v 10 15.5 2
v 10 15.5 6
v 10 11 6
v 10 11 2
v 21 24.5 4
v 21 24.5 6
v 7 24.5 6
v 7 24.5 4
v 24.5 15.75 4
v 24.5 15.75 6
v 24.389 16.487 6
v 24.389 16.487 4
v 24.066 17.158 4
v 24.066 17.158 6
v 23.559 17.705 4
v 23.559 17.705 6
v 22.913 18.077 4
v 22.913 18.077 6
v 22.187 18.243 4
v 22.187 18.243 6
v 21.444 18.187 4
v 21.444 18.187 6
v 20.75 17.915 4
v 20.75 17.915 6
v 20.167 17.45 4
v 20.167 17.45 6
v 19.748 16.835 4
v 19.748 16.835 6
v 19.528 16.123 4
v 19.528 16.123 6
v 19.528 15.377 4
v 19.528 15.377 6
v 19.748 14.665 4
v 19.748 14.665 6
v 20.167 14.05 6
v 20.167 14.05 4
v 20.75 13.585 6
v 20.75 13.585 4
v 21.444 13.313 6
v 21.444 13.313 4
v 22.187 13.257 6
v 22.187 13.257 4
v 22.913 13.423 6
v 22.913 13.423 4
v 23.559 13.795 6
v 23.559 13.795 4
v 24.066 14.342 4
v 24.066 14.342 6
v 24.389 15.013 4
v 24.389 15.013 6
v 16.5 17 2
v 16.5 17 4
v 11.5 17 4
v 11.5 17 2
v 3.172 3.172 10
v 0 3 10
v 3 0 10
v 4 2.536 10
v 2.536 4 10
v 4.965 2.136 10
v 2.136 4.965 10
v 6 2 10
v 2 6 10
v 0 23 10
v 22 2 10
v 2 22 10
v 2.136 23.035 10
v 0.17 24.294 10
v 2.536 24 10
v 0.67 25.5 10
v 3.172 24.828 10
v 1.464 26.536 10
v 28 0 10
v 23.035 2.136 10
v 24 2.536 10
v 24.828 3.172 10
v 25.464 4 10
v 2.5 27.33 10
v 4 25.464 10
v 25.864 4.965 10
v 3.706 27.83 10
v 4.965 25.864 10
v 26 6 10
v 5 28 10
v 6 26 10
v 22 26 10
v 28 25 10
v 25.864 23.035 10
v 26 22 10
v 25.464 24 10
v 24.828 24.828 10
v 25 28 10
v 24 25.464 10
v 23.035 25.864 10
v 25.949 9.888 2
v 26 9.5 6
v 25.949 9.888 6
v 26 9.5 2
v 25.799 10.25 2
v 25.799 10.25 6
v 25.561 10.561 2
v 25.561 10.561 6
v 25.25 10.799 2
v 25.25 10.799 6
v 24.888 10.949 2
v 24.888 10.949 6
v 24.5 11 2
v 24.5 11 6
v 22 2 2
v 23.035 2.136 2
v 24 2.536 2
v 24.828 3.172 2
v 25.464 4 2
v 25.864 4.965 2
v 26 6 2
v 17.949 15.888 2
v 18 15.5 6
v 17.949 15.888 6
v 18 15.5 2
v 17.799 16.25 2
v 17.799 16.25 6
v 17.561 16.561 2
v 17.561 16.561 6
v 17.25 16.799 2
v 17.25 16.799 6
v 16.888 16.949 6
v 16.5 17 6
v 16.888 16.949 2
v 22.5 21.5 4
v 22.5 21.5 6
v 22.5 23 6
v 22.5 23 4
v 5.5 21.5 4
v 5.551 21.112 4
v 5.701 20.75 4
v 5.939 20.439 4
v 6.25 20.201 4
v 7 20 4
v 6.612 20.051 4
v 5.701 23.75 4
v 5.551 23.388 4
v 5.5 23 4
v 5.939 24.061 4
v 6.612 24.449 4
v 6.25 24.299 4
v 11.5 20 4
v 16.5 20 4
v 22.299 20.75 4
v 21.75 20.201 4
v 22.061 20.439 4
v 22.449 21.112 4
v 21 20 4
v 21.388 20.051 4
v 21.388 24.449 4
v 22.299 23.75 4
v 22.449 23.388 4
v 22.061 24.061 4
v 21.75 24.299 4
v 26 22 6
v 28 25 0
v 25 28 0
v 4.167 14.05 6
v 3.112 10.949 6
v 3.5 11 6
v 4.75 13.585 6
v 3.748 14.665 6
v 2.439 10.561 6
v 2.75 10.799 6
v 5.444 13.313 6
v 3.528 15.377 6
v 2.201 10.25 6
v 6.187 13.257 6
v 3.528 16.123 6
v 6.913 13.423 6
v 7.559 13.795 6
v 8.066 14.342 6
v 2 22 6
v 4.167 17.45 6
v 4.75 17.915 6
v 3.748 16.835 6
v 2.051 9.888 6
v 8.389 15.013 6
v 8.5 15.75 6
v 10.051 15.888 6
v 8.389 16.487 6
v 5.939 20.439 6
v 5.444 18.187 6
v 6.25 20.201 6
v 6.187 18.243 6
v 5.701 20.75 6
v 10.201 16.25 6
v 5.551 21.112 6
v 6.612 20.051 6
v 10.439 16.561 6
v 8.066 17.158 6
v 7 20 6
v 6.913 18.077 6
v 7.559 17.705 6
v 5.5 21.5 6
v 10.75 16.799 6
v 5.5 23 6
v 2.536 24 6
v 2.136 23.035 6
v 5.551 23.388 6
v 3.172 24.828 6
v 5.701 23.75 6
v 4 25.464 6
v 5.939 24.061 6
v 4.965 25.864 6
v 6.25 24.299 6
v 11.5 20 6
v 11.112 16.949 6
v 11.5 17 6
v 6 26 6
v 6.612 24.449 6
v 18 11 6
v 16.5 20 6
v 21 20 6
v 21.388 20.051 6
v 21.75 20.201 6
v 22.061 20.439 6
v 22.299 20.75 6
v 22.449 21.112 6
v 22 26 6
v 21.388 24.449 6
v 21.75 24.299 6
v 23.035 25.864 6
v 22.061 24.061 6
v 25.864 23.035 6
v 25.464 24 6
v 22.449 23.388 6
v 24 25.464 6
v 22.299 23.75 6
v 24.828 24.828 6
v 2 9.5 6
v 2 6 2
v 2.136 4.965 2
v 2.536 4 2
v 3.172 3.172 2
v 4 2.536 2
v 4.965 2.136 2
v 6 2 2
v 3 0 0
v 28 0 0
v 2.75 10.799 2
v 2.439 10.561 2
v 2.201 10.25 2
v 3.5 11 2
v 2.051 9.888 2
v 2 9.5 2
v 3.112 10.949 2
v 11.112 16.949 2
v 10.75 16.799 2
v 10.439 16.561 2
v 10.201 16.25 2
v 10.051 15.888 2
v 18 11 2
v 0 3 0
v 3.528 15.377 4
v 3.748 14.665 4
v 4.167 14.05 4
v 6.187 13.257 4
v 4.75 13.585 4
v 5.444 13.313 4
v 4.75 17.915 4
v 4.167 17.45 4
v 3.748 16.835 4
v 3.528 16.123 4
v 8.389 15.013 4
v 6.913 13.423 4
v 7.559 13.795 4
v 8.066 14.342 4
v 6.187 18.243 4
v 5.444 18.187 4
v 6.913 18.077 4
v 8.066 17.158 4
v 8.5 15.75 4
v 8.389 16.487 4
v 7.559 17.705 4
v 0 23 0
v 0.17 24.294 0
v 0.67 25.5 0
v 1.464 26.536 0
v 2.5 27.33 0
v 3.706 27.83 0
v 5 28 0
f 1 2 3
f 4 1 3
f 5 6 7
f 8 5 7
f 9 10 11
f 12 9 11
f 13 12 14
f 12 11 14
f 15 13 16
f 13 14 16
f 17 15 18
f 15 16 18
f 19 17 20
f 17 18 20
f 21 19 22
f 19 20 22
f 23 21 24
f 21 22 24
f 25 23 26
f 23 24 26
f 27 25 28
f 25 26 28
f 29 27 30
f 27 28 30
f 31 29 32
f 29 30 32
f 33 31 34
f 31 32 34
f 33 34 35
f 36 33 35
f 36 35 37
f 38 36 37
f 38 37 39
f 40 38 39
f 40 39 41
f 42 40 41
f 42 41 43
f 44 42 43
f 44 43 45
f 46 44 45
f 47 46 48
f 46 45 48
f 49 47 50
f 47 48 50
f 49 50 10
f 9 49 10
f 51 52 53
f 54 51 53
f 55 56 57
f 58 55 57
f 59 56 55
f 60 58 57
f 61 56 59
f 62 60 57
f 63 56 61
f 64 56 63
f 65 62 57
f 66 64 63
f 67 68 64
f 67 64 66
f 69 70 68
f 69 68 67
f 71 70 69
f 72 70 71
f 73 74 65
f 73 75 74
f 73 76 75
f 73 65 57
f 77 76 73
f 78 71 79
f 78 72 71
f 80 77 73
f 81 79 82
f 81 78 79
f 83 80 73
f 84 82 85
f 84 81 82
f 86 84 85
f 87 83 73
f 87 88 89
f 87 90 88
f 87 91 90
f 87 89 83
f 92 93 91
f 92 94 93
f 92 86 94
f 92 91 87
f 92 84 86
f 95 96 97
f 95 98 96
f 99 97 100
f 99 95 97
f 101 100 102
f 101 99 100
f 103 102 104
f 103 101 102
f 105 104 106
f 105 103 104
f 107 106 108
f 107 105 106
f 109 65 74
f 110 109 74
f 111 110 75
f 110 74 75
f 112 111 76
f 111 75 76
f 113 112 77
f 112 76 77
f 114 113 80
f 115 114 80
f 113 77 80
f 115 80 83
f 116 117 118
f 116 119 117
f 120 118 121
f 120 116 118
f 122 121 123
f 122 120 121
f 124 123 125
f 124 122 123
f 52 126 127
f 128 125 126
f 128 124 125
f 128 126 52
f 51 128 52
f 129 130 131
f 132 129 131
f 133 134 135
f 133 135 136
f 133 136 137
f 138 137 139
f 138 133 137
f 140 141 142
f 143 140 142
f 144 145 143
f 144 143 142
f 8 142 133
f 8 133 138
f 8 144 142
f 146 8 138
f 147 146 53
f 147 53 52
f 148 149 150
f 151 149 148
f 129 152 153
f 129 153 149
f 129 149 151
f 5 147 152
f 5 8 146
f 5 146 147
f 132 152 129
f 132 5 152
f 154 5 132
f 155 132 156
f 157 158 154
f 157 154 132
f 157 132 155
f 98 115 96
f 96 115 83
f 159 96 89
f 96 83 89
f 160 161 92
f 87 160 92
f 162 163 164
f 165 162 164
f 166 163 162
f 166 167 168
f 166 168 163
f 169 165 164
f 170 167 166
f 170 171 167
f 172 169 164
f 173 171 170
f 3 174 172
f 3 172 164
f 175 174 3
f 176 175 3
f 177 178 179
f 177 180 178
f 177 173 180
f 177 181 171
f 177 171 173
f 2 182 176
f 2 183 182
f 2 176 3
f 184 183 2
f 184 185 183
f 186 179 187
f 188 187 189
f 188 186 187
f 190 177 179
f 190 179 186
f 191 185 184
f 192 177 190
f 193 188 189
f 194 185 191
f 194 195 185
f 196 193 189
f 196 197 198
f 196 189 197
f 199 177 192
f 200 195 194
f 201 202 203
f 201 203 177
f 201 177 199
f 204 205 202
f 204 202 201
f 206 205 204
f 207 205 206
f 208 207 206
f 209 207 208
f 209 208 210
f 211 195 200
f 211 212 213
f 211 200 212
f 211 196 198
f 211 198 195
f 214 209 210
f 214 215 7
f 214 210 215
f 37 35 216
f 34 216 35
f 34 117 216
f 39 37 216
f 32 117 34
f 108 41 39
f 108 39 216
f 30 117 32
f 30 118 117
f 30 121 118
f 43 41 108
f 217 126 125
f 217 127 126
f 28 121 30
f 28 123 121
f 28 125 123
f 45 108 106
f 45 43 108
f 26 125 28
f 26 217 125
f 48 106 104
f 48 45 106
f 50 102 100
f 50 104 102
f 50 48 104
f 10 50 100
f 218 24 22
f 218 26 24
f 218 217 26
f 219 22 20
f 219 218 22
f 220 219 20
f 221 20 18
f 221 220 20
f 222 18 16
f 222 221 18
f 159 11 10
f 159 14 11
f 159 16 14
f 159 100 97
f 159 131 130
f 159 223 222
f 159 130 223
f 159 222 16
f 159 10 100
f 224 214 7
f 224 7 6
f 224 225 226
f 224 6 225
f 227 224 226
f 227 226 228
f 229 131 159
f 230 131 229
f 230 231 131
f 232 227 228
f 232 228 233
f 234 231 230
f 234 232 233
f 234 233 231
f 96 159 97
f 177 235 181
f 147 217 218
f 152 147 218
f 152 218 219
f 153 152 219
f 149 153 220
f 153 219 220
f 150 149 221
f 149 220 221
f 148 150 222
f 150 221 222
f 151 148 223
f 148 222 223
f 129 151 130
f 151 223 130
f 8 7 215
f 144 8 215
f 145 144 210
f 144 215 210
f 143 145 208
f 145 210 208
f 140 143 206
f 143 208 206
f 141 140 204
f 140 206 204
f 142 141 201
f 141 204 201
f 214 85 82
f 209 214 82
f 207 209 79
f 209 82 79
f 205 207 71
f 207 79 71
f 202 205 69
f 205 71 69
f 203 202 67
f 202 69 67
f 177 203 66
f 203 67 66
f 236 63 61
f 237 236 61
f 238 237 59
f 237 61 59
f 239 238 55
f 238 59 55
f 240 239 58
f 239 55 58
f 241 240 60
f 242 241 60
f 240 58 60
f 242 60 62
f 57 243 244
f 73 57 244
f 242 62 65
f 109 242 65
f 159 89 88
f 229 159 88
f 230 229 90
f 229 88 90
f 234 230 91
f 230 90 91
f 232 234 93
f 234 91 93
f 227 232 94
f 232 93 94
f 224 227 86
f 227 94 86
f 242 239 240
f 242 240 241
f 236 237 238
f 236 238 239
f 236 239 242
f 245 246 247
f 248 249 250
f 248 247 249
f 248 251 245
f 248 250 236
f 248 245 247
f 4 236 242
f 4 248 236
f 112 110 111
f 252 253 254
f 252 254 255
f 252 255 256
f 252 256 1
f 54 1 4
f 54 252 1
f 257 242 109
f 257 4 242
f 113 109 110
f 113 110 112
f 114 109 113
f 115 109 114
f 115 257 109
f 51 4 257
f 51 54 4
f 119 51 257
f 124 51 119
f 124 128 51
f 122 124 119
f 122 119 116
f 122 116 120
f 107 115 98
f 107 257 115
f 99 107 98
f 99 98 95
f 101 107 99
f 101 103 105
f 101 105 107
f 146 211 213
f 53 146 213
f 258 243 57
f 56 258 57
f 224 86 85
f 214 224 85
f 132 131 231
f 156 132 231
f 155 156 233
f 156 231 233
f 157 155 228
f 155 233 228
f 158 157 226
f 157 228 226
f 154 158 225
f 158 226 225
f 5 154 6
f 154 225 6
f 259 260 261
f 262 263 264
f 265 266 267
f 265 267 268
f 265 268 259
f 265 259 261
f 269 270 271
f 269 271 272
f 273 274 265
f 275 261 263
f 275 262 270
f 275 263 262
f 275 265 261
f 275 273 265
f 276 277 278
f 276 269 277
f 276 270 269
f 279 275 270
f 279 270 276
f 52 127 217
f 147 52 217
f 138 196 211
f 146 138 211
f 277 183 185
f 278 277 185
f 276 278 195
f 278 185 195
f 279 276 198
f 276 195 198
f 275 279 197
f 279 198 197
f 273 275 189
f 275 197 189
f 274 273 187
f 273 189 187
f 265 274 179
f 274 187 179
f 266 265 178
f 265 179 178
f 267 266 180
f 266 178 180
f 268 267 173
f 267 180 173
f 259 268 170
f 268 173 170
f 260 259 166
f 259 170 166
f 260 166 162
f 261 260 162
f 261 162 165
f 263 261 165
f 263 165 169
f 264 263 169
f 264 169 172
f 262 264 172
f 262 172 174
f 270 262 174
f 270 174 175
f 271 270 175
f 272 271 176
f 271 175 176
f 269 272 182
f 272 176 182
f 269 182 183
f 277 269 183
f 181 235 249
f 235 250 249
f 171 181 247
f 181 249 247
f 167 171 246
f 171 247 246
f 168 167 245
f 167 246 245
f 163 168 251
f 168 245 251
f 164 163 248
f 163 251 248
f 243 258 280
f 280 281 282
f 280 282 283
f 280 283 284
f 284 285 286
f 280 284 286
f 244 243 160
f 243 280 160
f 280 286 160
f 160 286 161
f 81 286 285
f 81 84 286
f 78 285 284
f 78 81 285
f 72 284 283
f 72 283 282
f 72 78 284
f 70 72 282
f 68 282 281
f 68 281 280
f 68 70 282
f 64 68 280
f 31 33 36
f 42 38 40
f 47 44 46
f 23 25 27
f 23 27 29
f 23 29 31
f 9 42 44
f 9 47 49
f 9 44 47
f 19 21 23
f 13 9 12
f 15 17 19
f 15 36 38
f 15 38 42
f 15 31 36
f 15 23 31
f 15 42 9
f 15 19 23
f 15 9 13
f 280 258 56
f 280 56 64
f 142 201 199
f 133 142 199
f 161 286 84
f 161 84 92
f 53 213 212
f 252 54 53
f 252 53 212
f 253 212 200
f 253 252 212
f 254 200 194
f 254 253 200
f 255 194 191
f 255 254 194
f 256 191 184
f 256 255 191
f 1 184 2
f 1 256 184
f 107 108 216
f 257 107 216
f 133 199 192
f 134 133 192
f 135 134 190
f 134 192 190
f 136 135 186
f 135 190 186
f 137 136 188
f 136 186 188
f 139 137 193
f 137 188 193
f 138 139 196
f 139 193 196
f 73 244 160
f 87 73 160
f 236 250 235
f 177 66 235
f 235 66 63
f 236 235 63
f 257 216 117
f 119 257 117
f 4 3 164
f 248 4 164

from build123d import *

# Parameters (mm, degrees)
F0_W      = 28
F0_H      = 28
F1_DEPTH  = 10
F3_DEPTH  = 4
F5_DEPTH  = 4
F6_SIZE   = 3
F7_R      = 1.5
F8_R      = 5
F9_R      = 2.5
F10_DEPTH = 2


with BuildPart() as f1:
    # F0 (on Top) → F1 (new body)
    with BuildSketch(Plane.XY):
        with Locations((14, 14)):
            Rectangle(F0_W, F0_H)
    extrude(amount=F1_DEPTH)

    # F2 (on face) → F3 (cut)
    with BuildSketch(Plane.XY.offset(10)):
        with BuildLine():
            ThreePointArc((26, 22), (24.8284271247, 24.8284271247), (22, 26))
            Line((22, 26), (6, 26))
            ThreePointArc((6, 26), (3.1715728753, 24.8284271247), (2, 22))
            Line((2, 22), (2, 6))
            ThreePointArc((2, 6), (3.1715728753, 3.1715728753), (6, 2))
            Line((6, 2), (22, 2))
            ThreePointArc((22, 2), (24.8284271247, 3.1715728753), (26, 6))
            Line((26, 6), (26, 22))
        make_face()
    extrude(amount=-F3_DEPTH, mode=Mode.SUBTRACT)

    # F4 (on face) → F5 (cut)
    with BuildSketch(Plane.XY.offset(6)):
        with BuildLine():
            Line((10, 11), (2, 11))
            Line((2, 11), (2, 6))
            ThreePointArc((2, 6), (3.1715728753, 3.1715728753), (6, 2))
            Line((6, 2), (22, 2))
            ThreePointArc((22, 2), (24.8284271247, 3.1715728753), (26, 6))
            Line((26, 6), (26, 11))
            Line((26, 11), (18, 11))
            Line((18, 11), (18, 17))
            Line((18, 17), (10, 17))
            Line((10, 17), (10, 11))
        make_face()
    extrude(amount=-F5_DEPTH, mode=Mode.SUBTRACT)

    # F6
    f6_edges = [f1.edges().sort_by_distance(p)[0] for p in [
        (0, 0, 5),
        (28, 28, 5),
    ]]
    chamfer(f6_edges, length=F6_SIZE)

    # F7
    f7_edges = [f1.edges().sort_by_distance(p)[0] for p in [
        (2, 11, 4),
        (10, 17, 4),
        (18, 17, 4),
        (26, 11, 4),
    ]]
    fillet(f7_edges, radius=F7_R)

    # F8
    f8_edges = [f1.edges().sort_by_distance(p)[0] for p in [
        (0, 28, 5),
    ]]
    fillet(f8_edges, radius=F8_R)

    # F9 (on face) → F10 (cut)
    with BuildSketch(Plane.XY.offset(6)):
        with BuildLine():
            Line((11.5, 20), (11.5, 17))
            Line((11.5, 17), (16.5, 17))
            Line((16.5, 17), (16.5, 20))
            Line((16.5, 20), (21, 20))
            ThreePointArc((21, 20), (22.0606601718, 20.4393398282), (22.5, 21.5))
            Line((22.5, 21.5), (22.5, 23))
            ThreePointArc((22.5, 23), (22.0606601718, 24.0606601718), (21, 24.5))
            Line((21, 24.5), (7, 24.5))
            ThreePointArc((7, 24.5), (5.9393398282, 24.0606601718), (5.5, 23))
            Line((5.5, 23), (5.5, 21.5))
            ThreePointArc((5.5, 21.5), (5.9393398282, 20.4393398282), (7, 20))
            Line((7, 20), (11.5, 20))
        make_face()
        with Locations((22, 15.75)):
            Circle(F9_R)
        with Locations((6, 15.75)):
            Circle(F9_R)
    extrude(amount=-F10_DEPTH, mode=Mode.SUBTRACT)


solid = f1.part
